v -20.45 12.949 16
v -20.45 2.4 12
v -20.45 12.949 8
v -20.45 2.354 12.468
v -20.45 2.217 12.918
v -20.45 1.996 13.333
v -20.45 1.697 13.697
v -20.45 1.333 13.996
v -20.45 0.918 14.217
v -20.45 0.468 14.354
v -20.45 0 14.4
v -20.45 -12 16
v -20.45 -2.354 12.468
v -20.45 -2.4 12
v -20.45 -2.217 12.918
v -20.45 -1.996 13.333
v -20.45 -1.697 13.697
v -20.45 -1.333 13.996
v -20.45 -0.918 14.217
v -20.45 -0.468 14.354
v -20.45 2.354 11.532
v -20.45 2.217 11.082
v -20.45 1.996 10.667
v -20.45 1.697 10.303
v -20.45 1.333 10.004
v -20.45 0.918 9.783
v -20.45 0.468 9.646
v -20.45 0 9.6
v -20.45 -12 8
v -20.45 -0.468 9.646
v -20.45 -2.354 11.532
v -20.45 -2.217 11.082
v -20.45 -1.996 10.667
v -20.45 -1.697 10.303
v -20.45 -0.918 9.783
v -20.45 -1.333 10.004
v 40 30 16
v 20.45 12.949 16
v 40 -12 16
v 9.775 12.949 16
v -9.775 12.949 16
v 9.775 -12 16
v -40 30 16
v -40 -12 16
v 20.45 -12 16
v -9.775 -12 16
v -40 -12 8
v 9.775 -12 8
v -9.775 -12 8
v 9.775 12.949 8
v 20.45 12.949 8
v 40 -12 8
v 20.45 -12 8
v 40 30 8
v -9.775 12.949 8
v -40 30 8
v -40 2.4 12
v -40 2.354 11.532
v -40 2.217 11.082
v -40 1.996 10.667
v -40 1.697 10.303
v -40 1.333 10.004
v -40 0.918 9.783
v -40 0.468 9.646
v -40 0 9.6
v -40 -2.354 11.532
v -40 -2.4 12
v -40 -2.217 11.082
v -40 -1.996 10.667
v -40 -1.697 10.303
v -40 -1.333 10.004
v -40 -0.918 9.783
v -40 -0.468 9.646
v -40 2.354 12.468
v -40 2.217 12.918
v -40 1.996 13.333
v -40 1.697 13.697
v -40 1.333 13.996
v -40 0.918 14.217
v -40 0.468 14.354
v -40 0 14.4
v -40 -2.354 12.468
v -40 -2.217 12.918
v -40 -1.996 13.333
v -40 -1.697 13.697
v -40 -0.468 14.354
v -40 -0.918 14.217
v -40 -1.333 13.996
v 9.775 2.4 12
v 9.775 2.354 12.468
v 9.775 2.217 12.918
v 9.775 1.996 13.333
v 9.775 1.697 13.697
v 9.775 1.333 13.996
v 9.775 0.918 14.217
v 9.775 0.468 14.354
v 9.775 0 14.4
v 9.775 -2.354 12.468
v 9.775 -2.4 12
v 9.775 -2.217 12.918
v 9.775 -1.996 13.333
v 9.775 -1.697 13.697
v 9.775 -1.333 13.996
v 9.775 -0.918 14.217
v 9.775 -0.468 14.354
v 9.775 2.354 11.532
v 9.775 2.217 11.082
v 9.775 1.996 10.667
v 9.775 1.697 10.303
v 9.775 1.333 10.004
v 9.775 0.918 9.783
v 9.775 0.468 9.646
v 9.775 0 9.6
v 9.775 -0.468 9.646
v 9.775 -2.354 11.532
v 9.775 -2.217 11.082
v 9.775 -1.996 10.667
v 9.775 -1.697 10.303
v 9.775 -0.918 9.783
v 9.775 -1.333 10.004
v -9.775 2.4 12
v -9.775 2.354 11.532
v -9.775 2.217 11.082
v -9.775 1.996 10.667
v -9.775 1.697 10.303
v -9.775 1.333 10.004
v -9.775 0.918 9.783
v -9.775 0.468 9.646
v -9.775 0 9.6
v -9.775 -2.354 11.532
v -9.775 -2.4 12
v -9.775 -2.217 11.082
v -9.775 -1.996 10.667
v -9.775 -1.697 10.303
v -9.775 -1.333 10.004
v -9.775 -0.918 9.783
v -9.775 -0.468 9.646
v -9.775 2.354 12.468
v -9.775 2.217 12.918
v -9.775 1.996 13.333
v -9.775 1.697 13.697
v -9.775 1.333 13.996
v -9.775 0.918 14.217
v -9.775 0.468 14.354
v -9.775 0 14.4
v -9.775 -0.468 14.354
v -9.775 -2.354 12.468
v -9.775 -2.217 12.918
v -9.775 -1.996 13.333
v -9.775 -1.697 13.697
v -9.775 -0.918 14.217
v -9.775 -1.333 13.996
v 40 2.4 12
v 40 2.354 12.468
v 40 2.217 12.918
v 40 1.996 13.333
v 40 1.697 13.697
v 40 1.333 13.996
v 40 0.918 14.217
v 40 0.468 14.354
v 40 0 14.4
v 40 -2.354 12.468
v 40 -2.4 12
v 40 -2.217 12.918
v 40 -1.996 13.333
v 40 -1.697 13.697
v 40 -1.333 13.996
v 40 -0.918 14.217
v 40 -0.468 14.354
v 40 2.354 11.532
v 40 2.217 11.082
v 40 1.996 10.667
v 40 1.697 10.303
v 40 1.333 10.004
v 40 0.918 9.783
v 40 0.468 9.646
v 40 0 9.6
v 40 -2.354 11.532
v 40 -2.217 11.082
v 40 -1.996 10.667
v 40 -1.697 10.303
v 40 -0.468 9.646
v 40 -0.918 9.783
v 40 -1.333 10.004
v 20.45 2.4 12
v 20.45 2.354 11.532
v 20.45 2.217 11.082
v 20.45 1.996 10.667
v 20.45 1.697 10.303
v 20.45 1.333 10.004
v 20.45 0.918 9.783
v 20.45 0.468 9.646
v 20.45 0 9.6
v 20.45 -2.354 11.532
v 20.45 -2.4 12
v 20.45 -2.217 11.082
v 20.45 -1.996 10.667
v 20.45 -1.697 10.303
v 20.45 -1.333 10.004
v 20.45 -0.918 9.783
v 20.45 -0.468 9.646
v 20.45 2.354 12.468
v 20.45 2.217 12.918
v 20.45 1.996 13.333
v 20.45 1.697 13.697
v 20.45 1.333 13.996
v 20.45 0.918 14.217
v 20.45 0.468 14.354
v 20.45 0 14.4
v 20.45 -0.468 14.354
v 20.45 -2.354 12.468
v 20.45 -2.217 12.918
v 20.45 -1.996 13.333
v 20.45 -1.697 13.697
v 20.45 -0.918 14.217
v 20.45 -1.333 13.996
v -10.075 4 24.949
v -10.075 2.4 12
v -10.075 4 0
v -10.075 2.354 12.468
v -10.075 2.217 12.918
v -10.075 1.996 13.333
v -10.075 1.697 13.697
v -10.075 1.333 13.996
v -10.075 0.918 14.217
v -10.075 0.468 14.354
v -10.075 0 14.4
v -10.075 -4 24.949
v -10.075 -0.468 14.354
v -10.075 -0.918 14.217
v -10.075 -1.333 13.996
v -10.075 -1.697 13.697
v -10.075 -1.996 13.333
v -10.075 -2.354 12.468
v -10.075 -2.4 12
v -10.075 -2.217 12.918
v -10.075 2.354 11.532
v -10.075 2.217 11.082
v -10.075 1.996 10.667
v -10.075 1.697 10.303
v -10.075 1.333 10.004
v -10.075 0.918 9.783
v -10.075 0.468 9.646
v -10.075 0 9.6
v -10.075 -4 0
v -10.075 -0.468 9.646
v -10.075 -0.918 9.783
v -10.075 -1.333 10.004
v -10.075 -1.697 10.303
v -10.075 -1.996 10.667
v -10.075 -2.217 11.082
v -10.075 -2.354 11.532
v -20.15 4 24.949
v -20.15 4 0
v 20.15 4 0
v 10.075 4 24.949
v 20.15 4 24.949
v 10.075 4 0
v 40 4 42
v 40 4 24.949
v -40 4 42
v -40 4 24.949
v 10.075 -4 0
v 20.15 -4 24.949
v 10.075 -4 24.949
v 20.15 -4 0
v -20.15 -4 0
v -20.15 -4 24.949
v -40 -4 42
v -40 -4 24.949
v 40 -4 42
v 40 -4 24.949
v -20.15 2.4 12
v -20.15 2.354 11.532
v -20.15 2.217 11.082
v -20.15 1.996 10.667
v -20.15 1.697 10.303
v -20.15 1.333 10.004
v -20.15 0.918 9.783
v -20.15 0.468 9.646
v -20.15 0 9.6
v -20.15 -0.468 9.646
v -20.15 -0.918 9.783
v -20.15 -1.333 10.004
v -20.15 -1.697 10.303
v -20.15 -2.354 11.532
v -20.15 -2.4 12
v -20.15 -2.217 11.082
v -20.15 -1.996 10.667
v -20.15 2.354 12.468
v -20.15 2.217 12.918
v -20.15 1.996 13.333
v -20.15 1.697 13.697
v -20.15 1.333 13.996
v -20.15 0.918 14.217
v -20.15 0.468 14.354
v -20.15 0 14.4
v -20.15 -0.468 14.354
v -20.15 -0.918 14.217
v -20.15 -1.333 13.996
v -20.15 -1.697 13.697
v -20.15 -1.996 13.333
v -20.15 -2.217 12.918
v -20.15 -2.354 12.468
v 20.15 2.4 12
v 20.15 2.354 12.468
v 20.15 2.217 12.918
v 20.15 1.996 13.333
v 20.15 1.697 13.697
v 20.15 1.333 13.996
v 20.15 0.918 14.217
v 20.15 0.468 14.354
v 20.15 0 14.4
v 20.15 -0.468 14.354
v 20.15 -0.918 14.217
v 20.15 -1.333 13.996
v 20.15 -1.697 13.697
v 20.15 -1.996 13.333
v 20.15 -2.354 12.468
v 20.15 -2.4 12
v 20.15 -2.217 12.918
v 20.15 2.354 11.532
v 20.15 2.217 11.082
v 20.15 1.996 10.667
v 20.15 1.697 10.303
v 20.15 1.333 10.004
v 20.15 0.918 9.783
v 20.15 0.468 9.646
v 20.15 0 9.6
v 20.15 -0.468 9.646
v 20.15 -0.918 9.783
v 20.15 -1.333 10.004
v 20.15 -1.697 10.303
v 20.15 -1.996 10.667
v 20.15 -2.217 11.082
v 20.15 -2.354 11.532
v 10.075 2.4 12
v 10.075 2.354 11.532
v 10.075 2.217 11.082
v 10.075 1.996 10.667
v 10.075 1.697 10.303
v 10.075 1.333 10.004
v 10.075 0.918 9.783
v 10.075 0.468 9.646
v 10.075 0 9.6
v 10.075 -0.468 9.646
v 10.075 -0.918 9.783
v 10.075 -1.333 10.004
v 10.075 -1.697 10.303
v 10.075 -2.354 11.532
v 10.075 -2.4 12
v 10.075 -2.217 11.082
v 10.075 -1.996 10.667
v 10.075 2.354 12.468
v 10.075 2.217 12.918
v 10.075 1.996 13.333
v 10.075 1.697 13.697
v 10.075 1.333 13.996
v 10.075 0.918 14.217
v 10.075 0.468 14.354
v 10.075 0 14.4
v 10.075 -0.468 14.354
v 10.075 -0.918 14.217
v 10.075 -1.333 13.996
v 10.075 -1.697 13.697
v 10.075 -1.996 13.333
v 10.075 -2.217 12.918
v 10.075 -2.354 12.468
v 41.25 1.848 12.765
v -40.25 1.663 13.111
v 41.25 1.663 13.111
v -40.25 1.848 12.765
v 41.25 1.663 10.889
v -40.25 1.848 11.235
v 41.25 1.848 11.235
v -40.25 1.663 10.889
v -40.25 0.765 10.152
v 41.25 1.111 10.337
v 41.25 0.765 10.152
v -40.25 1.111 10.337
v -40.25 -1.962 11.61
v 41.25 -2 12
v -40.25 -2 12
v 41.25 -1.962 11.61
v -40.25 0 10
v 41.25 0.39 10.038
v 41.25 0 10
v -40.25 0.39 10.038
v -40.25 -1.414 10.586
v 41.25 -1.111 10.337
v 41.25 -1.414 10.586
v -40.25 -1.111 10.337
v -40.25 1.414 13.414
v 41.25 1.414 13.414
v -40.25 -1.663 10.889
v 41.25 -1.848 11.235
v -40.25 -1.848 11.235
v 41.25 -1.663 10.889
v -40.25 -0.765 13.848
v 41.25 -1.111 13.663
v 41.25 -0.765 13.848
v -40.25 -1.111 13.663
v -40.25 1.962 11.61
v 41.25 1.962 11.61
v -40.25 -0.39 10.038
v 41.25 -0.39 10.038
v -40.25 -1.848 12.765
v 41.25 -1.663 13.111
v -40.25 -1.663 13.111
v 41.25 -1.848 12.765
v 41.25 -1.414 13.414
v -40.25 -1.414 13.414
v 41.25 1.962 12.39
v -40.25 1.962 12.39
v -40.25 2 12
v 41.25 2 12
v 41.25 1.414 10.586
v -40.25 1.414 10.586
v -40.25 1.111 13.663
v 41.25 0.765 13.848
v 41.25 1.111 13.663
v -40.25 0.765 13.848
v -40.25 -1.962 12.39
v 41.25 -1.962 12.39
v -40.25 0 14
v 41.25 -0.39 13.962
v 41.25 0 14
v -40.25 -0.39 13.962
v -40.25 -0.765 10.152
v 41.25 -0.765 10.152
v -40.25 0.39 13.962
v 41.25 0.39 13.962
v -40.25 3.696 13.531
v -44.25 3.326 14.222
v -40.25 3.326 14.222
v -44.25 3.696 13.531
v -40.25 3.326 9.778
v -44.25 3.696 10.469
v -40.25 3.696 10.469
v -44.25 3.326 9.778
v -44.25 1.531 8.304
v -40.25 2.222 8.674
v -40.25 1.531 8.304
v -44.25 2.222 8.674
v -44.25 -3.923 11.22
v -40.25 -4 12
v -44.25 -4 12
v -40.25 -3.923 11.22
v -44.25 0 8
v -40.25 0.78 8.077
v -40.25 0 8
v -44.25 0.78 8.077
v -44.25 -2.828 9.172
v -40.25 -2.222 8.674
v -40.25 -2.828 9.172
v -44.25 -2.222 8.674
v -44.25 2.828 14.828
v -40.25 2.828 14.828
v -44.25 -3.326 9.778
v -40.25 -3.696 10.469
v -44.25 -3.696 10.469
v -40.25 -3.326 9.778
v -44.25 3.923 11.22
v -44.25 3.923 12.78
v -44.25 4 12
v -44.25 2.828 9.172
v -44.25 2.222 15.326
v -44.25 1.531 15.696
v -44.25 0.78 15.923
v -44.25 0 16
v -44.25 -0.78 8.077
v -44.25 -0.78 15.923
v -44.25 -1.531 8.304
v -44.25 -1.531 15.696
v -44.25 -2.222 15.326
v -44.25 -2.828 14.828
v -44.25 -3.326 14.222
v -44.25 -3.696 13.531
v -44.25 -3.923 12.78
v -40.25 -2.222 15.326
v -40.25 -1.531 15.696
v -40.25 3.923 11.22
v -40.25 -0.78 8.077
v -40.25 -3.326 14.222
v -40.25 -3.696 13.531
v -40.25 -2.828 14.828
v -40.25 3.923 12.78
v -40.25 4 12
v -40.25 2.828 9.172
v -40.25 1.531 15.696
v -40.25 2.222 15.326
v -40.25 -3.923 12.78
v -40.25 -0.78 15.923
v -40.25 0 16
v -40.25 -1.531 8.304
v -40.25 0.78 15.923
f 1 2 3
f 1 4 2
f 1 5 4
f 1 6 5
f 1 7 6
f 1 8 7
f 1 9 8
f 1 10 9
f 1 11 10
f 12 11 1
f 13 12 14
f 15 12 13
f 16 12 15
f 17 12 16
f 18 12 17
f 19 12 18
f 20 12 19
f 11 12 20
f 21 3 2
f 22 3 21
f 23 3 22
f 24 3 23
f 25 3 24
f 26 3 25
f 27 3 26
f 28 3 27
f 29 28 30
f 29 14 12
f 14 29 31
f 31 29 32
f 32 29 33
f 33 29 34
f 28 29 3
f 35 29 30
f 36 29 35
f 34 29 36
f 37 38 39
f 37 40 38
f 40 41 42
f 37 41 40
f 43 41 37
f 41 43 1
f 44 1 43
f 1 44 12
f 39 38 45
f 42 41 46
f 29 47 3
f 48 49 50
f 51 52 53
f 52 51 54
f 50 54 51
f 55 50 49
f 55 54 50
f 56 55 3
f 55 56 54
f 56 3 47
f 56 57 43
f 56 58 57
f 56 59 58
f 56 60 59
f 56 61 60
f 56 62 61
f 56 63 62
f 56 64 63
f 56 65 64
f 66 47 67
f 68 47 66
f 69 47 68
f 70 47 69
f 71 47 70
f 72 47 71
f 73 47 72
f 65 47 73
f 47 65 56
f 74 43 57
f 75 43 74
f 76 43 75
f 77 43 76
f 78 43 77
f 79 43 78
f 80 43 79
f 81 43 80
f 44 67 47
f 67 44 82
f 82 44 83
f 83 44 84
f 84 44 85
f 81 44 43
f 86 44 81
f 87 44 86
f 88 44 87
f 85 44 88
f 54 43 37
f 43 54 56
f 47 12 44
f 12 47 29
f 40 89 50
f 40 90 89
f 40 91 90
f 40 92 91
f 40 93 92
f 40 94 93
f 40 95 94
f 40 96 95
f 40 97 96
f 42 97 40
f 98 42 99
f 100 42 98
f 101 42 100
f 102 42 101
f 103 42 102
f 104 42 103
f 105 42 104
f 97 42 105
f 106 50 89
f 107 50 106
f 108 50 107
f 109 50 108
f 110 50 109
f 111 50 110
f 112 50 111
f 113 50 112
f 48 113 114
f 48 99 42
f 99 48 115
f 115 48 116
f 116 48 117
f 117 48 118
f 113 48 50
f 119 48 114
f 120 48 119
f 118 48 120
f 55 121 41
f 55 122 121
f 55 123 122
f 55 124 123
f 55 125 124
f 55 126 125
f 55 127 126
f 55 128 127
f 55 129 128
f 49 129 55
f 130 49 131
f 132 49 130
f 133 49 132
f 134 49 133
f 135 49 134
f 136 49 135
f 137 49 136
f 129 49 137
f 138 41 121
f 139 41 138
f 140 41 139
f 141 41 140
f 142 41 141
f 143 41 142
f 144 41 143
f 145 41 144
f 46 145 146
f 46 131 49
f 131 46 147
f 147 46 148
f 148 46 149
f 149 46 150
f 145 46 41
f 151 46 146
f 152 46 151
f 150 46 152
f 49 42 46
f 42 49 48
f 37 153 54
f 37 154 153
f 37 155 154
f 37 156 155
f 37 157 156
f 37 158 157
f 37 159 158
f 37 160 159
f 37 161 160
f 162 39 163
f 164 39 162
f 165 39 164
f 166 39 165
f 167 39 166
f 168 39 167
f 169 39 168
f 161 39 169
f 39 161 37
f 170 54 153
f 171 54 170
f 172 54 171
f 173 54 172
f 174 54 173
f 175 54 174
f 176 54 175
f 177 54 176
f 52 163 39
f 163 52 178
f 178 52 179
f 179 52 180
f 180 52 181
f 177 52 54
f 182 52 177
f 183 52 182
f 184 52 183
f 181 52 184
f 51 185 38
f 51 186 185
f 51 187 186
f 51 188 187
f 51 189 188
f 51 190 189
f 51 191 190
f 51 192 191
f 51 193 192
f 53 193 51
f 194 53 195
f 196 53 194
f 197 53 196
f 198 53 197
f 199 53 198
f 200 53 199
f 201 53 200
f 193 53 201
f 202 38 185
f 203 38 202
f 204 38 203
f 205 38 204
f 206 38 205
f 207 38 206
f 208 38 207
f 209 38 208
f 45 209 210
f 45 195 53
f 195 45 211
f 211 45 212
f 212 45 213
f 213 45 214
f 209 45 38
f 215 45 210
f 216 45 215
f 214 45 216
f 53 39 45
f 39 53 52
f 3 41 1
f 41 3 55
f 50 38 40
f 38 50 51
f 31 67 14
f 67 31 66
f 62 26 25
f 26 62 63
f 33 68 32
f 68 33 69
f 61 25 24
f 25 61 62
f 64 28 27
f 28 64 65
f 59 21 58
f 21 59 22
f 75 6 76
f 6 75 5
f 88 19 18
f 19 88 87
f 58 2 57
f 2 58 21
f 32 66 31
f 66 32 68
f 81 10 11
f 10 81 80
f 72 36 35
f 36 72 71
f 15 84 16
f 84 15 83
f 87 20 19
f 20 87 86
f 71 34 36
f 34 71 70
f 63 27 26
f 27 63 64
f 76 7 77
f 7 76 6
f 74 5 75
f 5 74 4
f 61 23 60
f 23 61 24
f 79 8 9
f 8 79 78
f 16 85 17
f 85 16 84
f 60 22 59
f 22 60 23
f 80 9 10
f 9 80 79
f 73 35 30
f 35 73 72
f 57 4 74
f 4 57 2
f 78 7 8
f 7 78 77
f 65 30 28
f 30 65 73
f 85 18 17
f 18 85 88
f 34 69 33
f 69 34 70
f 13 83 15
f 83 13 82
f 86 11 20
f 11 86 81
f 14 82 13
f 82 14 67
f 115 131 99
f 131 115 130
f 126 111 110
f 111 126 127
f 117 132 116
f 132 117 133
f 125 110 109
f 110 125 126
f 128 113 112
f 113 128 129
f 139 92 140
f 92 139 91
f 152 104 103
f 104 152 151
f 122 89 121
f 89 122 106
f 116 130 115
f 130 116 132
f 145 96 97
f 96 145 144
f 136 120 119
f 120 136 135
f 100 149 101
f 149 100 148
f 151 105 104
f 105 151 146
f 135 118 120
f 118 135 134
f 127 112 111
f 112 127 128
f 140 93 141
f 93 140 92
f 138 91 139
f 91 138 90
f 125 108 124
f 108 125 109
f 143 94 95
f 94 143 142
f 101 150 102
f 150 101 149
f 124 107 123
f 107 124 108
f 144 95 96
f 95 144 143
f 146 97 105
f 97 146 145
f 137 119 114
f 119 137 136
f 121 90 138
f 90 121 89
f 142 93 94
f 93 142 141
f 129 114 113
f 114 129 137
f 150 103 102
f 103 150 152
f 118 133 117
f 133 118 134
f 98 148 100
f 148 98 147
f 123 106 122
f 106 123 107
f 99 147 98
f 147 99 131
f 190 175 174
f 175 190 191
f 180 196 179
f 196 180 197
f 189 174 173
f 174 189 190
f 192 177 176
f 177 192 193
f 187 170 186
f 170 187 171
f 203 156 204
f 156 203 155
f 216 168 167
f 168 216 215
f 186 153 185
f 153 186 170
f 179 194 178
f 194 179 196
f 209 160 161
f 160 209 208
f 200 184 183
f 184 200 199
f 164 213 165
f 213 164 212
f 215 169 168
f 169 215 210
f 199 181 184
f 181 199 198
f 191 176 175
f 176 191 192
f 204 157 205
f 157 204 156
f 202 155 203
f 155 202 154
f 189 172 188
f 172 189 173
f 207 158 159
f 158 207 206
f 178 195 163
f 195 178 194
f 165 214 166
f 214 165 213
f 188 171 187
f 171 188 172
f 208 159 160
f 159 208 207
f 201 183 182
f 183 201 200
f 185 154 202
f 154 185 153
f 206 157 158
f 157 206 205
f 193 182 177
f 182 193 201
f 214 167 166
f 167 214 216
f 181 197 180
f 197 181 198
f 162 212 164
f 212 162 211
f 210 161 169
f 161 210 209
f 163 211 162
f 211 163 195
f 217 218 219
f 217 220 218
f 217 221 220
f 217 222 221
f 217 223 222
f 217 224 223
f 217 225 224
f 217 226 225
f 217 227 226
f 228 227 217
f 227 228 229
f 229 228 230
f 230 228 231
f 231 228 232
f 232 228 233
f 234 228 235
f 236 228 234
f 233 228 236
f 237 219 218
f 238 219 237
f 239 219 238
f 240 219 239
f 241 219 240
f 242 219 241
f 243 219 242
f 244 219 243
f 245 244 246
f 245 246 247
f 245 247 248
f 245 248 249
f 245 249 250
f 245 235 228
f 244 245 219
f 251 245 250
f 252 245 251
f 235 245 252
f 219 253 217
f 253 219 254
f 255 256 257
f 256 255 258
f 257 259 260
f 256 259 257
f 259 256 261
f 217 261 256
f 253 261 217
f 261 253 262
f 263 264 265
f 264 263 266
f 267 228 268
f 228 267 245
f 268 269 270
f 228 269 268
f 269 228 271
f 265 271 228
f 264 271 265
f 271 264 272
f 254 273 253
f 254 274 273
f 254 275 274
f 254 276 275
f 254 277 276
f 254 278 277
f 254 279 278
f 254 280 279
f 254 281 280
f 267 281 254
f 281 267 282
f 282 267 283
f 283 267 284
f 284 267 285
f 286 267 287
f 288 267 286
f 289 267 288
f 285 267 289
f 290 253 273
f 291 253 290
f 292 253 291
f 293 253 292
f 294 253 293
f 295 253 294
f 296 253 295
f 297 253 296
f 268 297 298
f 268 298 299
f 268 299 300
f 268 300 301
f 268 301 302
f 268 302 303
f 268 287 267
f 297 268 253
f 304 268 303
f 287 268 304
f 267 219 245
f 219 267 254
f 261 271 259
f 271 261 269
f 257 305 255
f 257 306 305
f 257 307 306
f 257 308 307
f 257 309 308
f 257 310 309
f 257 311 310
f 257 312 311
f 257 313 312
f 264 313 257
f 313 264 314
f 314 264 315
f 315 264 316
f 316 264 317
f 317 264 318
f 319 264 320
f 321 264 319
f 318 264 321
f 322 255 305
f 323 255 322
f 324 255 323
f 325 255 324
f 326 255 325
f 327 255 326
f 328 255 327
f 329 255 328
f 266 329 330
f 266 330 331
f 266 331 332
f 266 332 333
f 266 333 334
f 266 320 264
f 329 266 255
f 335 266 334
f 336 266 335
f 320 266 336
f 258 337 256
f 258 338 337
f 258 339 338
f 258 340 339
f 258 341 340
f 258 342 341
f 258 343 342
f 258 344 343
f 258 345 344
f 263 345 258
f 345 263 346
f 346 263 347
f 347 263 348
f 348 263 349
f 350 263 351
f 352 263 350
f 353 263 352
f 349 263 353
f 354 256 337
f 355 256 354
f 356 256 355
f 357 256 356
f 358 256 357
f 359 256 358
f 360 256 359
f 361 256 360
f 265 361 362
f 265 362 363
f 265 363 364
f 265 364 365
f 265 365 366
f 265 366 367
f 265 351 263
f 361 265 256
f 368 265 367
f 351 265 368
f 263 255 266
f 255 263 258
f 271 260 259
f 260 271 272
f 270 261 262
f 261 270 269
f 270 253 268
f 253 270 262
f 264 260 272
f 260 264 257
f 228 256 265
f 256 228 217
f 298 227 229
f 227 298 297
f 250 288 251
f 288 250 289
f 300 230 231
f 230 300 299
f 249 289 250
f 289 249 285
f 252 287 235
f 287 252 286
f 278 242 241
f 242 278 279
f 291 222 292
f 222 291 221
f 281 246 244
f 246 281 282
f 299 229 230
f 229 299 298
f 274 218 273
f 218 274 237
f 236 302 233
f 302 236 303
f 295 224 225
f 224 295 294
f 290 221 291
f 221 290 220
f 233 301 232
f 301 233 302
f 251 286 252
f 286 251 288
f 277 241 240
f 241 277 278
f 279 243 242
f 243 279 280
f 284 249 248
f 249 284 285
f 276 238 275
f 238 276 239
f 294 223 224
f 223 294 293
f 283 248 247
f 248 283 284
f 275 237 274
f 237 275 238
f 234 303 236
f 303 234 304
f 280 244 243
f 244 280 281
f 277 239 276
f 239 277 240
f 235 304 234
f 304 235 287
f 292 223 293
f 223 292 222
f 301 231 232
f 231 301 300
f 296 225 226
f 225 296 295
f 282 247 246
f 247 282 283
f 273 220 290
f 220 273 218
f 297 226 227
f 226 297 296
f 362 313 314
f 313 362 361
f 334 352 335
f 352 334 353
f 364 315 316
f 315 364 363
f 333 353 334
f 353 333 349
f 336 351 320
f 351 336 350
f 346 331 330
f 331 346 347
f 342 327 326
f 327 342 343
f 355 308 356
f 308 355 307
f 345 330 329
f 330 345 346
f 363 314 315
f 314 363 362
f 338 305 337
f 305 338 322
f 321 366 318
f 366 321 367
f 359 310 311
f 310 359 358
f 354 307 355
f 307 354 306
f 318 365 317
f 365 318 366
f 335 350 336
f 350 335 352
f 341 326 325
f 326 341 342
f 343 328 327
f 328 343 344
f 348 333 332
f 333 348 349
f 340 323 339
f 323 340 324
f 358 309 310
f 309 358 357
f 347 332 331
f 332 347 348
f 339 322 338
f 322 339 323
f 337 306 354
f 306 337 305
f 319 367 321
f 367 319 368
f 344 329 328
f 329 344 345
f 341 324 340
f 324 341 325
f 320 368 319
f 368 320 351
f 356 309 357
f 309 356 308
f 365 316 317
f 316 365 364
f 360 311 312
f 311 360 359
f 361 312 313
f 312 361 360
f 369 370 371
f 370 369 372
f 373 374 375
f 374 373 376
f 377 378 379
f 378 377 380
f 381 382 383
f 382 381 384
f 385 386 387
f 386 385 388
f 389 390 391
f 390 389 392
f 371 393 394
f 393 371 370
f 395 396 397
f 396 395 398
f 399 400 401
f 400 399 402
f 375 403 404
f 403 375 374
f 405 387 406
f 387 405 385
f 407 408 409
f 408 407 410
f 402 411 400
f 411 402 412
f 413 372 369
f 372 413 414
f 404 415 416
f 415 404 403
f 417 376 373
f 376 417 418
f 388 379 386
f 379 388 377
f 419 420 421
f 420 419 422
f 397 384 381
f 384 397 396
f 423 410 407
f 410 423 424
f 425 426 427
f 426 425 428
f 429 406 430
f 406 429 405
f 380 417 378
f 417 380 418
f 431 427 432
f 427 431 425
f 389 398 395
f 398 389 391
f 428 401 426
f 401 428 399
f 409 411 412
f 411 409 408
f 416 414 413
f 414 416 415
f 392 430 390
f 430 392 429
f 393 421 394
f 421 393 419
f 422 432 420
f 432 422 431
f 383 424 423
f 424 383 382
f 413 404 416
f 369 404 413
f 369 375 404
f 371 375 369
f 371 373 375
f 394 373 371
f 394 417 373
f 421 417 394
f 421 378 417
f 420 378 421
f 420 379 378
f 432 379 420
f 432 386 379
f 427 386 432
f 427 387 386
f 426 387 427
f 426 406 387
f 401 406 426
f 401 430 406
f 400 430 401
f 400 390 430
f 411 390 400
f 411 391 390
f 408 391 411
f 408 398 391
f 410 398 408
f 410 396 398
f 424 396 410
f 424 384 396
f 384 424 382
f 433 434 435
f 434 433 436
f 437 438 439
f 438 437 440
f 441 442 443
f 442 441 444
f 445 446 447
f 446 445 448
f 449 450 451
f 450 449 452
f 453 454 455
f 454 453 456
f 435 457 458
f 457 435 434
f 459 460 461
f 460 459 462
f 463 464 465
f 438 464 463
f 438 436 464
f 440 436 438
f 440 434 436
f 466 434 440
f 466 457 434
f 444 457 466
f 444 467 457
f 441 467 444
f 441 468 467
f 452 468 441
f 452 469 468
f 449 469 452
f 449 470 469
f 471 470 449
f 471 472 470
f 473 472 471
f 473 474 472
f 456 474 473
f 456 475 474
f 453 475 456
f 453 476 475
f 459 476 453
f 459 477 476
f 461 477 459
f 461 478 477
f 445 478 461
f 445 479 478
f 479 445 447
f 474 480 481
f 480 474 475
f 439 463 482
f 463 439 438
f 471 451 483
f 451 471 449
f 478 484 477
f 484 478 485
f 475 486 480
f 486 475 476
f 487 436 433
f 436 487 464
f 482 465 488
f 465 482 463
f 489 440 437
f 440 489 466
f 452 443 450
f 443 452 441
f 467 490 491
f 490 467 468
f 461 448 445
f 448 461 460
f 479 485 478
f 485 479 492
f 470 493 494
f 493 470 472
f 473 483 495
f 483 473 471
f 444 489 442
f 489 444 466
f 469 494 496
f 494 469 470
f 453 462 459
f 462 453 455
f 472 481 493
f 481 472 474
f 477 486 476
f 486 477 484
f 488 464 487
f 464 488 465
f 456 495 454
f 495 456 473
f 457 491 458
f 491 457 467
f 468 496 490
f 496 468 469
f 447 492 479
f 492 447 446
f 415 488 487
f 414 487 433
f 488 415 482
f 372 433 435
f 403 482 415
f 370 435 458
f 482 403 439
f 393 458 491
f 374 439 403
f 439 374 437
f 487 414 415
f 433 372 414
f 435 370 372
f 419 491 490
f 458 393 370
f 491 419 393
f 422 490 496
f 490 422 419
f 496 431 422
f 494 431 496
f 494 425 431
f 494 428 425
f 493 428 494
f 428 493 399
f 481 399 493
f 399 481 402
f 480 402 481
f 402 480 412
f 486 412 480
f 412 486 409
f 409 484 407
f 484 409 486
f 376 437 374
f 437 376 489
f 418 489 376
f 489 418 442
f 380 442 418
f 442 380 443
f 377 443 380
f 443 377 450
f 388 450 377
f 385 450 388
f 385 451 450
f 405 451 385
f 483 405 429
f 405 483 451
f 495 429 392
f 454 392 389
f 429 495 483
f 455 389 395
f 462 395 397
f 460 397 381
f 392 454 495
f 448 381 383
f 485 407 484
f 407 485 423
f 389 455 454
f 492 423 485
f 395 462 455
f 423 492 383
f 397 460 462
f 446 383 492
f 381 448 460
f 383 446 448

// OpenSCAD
$fn = 32;

// ------------------------------------------------------------------------
// Butt hinge: hinge 80 mm, leaf swung 270 deg
// Every part is its own module, assembly() places every instance.
// ------------------------------------------------------------------------

// --- part 1 ---
module hinge_base() {
  difference() {
    union() {
      translate([-40, -12, -4]) cube([19.55, 42, 8]);
      translate([-9.775, -12, -4]) cube([19.55, 42, 8]);
      translate([20.45, -12, -4]) cube([19.55, 42, 8]);
      translate([-40, 12.949, -4]) cube([80, 17.051, 8]);
    }
    translate([-30.225, 0, 0]) rotate([0, 90, 0]) cylinder(h = 21.55, d = 4.8, center = true);
    translate([0, 0, 0]) rotate([0, 90, 0]) cylinder(h = 21.55, d = 4.8, center = true);
    translate([30.225, 0, 0]) rotate([0, 90, 0]) cylinder(h = 21.55, d = 4.8, center = true);
  }
}

// --- part 2 ---
module hinge_mover() {
  difference() {
    union() {
      translate([-20.15, -30, -4]) cube([10.075, 42, 8]);
      translate([10.075, -30, -4]) cube([10.075, 42, 8]);
      translate([-40, -30, -4]) cube([80, 17.051, 8]);
    }
    translate([-15.113, 0, 0]) rotate([0, 90, 0]) cylinder(h = 12.075, d = 4.8, center = true);
    translate([15.113, 0, 0]) rotate([0, 90, 0]) cylinder(h = 12.075, d = 4.8, center = true);
  }
}

// --- part 3 ---
module hinge_pin() {
  rotate([0, 90, 0]) cylinder(h = 82.5, d = 4, center = true);
  translate([-44.25, 0, 0]) rotate([0, 90, 0]) cylinder(h = 4, d = 8);
}

// --- assembly ---
module assembly() {
  color([0.80, 0.24, 0.20]) translate([0, 0, 12]) rotate([0, 0, 0]) hinge_base();
  color([0.20, 0.45, 0.75]) translate([0, 0, 12]) rotate([270, 0, 0]) hinge_mover();
  color([0.25, 0.62, 0.32]) translate([0, 0, 12]) rotate([0, 0, 0]) hinge_pin();
}

assembly();
